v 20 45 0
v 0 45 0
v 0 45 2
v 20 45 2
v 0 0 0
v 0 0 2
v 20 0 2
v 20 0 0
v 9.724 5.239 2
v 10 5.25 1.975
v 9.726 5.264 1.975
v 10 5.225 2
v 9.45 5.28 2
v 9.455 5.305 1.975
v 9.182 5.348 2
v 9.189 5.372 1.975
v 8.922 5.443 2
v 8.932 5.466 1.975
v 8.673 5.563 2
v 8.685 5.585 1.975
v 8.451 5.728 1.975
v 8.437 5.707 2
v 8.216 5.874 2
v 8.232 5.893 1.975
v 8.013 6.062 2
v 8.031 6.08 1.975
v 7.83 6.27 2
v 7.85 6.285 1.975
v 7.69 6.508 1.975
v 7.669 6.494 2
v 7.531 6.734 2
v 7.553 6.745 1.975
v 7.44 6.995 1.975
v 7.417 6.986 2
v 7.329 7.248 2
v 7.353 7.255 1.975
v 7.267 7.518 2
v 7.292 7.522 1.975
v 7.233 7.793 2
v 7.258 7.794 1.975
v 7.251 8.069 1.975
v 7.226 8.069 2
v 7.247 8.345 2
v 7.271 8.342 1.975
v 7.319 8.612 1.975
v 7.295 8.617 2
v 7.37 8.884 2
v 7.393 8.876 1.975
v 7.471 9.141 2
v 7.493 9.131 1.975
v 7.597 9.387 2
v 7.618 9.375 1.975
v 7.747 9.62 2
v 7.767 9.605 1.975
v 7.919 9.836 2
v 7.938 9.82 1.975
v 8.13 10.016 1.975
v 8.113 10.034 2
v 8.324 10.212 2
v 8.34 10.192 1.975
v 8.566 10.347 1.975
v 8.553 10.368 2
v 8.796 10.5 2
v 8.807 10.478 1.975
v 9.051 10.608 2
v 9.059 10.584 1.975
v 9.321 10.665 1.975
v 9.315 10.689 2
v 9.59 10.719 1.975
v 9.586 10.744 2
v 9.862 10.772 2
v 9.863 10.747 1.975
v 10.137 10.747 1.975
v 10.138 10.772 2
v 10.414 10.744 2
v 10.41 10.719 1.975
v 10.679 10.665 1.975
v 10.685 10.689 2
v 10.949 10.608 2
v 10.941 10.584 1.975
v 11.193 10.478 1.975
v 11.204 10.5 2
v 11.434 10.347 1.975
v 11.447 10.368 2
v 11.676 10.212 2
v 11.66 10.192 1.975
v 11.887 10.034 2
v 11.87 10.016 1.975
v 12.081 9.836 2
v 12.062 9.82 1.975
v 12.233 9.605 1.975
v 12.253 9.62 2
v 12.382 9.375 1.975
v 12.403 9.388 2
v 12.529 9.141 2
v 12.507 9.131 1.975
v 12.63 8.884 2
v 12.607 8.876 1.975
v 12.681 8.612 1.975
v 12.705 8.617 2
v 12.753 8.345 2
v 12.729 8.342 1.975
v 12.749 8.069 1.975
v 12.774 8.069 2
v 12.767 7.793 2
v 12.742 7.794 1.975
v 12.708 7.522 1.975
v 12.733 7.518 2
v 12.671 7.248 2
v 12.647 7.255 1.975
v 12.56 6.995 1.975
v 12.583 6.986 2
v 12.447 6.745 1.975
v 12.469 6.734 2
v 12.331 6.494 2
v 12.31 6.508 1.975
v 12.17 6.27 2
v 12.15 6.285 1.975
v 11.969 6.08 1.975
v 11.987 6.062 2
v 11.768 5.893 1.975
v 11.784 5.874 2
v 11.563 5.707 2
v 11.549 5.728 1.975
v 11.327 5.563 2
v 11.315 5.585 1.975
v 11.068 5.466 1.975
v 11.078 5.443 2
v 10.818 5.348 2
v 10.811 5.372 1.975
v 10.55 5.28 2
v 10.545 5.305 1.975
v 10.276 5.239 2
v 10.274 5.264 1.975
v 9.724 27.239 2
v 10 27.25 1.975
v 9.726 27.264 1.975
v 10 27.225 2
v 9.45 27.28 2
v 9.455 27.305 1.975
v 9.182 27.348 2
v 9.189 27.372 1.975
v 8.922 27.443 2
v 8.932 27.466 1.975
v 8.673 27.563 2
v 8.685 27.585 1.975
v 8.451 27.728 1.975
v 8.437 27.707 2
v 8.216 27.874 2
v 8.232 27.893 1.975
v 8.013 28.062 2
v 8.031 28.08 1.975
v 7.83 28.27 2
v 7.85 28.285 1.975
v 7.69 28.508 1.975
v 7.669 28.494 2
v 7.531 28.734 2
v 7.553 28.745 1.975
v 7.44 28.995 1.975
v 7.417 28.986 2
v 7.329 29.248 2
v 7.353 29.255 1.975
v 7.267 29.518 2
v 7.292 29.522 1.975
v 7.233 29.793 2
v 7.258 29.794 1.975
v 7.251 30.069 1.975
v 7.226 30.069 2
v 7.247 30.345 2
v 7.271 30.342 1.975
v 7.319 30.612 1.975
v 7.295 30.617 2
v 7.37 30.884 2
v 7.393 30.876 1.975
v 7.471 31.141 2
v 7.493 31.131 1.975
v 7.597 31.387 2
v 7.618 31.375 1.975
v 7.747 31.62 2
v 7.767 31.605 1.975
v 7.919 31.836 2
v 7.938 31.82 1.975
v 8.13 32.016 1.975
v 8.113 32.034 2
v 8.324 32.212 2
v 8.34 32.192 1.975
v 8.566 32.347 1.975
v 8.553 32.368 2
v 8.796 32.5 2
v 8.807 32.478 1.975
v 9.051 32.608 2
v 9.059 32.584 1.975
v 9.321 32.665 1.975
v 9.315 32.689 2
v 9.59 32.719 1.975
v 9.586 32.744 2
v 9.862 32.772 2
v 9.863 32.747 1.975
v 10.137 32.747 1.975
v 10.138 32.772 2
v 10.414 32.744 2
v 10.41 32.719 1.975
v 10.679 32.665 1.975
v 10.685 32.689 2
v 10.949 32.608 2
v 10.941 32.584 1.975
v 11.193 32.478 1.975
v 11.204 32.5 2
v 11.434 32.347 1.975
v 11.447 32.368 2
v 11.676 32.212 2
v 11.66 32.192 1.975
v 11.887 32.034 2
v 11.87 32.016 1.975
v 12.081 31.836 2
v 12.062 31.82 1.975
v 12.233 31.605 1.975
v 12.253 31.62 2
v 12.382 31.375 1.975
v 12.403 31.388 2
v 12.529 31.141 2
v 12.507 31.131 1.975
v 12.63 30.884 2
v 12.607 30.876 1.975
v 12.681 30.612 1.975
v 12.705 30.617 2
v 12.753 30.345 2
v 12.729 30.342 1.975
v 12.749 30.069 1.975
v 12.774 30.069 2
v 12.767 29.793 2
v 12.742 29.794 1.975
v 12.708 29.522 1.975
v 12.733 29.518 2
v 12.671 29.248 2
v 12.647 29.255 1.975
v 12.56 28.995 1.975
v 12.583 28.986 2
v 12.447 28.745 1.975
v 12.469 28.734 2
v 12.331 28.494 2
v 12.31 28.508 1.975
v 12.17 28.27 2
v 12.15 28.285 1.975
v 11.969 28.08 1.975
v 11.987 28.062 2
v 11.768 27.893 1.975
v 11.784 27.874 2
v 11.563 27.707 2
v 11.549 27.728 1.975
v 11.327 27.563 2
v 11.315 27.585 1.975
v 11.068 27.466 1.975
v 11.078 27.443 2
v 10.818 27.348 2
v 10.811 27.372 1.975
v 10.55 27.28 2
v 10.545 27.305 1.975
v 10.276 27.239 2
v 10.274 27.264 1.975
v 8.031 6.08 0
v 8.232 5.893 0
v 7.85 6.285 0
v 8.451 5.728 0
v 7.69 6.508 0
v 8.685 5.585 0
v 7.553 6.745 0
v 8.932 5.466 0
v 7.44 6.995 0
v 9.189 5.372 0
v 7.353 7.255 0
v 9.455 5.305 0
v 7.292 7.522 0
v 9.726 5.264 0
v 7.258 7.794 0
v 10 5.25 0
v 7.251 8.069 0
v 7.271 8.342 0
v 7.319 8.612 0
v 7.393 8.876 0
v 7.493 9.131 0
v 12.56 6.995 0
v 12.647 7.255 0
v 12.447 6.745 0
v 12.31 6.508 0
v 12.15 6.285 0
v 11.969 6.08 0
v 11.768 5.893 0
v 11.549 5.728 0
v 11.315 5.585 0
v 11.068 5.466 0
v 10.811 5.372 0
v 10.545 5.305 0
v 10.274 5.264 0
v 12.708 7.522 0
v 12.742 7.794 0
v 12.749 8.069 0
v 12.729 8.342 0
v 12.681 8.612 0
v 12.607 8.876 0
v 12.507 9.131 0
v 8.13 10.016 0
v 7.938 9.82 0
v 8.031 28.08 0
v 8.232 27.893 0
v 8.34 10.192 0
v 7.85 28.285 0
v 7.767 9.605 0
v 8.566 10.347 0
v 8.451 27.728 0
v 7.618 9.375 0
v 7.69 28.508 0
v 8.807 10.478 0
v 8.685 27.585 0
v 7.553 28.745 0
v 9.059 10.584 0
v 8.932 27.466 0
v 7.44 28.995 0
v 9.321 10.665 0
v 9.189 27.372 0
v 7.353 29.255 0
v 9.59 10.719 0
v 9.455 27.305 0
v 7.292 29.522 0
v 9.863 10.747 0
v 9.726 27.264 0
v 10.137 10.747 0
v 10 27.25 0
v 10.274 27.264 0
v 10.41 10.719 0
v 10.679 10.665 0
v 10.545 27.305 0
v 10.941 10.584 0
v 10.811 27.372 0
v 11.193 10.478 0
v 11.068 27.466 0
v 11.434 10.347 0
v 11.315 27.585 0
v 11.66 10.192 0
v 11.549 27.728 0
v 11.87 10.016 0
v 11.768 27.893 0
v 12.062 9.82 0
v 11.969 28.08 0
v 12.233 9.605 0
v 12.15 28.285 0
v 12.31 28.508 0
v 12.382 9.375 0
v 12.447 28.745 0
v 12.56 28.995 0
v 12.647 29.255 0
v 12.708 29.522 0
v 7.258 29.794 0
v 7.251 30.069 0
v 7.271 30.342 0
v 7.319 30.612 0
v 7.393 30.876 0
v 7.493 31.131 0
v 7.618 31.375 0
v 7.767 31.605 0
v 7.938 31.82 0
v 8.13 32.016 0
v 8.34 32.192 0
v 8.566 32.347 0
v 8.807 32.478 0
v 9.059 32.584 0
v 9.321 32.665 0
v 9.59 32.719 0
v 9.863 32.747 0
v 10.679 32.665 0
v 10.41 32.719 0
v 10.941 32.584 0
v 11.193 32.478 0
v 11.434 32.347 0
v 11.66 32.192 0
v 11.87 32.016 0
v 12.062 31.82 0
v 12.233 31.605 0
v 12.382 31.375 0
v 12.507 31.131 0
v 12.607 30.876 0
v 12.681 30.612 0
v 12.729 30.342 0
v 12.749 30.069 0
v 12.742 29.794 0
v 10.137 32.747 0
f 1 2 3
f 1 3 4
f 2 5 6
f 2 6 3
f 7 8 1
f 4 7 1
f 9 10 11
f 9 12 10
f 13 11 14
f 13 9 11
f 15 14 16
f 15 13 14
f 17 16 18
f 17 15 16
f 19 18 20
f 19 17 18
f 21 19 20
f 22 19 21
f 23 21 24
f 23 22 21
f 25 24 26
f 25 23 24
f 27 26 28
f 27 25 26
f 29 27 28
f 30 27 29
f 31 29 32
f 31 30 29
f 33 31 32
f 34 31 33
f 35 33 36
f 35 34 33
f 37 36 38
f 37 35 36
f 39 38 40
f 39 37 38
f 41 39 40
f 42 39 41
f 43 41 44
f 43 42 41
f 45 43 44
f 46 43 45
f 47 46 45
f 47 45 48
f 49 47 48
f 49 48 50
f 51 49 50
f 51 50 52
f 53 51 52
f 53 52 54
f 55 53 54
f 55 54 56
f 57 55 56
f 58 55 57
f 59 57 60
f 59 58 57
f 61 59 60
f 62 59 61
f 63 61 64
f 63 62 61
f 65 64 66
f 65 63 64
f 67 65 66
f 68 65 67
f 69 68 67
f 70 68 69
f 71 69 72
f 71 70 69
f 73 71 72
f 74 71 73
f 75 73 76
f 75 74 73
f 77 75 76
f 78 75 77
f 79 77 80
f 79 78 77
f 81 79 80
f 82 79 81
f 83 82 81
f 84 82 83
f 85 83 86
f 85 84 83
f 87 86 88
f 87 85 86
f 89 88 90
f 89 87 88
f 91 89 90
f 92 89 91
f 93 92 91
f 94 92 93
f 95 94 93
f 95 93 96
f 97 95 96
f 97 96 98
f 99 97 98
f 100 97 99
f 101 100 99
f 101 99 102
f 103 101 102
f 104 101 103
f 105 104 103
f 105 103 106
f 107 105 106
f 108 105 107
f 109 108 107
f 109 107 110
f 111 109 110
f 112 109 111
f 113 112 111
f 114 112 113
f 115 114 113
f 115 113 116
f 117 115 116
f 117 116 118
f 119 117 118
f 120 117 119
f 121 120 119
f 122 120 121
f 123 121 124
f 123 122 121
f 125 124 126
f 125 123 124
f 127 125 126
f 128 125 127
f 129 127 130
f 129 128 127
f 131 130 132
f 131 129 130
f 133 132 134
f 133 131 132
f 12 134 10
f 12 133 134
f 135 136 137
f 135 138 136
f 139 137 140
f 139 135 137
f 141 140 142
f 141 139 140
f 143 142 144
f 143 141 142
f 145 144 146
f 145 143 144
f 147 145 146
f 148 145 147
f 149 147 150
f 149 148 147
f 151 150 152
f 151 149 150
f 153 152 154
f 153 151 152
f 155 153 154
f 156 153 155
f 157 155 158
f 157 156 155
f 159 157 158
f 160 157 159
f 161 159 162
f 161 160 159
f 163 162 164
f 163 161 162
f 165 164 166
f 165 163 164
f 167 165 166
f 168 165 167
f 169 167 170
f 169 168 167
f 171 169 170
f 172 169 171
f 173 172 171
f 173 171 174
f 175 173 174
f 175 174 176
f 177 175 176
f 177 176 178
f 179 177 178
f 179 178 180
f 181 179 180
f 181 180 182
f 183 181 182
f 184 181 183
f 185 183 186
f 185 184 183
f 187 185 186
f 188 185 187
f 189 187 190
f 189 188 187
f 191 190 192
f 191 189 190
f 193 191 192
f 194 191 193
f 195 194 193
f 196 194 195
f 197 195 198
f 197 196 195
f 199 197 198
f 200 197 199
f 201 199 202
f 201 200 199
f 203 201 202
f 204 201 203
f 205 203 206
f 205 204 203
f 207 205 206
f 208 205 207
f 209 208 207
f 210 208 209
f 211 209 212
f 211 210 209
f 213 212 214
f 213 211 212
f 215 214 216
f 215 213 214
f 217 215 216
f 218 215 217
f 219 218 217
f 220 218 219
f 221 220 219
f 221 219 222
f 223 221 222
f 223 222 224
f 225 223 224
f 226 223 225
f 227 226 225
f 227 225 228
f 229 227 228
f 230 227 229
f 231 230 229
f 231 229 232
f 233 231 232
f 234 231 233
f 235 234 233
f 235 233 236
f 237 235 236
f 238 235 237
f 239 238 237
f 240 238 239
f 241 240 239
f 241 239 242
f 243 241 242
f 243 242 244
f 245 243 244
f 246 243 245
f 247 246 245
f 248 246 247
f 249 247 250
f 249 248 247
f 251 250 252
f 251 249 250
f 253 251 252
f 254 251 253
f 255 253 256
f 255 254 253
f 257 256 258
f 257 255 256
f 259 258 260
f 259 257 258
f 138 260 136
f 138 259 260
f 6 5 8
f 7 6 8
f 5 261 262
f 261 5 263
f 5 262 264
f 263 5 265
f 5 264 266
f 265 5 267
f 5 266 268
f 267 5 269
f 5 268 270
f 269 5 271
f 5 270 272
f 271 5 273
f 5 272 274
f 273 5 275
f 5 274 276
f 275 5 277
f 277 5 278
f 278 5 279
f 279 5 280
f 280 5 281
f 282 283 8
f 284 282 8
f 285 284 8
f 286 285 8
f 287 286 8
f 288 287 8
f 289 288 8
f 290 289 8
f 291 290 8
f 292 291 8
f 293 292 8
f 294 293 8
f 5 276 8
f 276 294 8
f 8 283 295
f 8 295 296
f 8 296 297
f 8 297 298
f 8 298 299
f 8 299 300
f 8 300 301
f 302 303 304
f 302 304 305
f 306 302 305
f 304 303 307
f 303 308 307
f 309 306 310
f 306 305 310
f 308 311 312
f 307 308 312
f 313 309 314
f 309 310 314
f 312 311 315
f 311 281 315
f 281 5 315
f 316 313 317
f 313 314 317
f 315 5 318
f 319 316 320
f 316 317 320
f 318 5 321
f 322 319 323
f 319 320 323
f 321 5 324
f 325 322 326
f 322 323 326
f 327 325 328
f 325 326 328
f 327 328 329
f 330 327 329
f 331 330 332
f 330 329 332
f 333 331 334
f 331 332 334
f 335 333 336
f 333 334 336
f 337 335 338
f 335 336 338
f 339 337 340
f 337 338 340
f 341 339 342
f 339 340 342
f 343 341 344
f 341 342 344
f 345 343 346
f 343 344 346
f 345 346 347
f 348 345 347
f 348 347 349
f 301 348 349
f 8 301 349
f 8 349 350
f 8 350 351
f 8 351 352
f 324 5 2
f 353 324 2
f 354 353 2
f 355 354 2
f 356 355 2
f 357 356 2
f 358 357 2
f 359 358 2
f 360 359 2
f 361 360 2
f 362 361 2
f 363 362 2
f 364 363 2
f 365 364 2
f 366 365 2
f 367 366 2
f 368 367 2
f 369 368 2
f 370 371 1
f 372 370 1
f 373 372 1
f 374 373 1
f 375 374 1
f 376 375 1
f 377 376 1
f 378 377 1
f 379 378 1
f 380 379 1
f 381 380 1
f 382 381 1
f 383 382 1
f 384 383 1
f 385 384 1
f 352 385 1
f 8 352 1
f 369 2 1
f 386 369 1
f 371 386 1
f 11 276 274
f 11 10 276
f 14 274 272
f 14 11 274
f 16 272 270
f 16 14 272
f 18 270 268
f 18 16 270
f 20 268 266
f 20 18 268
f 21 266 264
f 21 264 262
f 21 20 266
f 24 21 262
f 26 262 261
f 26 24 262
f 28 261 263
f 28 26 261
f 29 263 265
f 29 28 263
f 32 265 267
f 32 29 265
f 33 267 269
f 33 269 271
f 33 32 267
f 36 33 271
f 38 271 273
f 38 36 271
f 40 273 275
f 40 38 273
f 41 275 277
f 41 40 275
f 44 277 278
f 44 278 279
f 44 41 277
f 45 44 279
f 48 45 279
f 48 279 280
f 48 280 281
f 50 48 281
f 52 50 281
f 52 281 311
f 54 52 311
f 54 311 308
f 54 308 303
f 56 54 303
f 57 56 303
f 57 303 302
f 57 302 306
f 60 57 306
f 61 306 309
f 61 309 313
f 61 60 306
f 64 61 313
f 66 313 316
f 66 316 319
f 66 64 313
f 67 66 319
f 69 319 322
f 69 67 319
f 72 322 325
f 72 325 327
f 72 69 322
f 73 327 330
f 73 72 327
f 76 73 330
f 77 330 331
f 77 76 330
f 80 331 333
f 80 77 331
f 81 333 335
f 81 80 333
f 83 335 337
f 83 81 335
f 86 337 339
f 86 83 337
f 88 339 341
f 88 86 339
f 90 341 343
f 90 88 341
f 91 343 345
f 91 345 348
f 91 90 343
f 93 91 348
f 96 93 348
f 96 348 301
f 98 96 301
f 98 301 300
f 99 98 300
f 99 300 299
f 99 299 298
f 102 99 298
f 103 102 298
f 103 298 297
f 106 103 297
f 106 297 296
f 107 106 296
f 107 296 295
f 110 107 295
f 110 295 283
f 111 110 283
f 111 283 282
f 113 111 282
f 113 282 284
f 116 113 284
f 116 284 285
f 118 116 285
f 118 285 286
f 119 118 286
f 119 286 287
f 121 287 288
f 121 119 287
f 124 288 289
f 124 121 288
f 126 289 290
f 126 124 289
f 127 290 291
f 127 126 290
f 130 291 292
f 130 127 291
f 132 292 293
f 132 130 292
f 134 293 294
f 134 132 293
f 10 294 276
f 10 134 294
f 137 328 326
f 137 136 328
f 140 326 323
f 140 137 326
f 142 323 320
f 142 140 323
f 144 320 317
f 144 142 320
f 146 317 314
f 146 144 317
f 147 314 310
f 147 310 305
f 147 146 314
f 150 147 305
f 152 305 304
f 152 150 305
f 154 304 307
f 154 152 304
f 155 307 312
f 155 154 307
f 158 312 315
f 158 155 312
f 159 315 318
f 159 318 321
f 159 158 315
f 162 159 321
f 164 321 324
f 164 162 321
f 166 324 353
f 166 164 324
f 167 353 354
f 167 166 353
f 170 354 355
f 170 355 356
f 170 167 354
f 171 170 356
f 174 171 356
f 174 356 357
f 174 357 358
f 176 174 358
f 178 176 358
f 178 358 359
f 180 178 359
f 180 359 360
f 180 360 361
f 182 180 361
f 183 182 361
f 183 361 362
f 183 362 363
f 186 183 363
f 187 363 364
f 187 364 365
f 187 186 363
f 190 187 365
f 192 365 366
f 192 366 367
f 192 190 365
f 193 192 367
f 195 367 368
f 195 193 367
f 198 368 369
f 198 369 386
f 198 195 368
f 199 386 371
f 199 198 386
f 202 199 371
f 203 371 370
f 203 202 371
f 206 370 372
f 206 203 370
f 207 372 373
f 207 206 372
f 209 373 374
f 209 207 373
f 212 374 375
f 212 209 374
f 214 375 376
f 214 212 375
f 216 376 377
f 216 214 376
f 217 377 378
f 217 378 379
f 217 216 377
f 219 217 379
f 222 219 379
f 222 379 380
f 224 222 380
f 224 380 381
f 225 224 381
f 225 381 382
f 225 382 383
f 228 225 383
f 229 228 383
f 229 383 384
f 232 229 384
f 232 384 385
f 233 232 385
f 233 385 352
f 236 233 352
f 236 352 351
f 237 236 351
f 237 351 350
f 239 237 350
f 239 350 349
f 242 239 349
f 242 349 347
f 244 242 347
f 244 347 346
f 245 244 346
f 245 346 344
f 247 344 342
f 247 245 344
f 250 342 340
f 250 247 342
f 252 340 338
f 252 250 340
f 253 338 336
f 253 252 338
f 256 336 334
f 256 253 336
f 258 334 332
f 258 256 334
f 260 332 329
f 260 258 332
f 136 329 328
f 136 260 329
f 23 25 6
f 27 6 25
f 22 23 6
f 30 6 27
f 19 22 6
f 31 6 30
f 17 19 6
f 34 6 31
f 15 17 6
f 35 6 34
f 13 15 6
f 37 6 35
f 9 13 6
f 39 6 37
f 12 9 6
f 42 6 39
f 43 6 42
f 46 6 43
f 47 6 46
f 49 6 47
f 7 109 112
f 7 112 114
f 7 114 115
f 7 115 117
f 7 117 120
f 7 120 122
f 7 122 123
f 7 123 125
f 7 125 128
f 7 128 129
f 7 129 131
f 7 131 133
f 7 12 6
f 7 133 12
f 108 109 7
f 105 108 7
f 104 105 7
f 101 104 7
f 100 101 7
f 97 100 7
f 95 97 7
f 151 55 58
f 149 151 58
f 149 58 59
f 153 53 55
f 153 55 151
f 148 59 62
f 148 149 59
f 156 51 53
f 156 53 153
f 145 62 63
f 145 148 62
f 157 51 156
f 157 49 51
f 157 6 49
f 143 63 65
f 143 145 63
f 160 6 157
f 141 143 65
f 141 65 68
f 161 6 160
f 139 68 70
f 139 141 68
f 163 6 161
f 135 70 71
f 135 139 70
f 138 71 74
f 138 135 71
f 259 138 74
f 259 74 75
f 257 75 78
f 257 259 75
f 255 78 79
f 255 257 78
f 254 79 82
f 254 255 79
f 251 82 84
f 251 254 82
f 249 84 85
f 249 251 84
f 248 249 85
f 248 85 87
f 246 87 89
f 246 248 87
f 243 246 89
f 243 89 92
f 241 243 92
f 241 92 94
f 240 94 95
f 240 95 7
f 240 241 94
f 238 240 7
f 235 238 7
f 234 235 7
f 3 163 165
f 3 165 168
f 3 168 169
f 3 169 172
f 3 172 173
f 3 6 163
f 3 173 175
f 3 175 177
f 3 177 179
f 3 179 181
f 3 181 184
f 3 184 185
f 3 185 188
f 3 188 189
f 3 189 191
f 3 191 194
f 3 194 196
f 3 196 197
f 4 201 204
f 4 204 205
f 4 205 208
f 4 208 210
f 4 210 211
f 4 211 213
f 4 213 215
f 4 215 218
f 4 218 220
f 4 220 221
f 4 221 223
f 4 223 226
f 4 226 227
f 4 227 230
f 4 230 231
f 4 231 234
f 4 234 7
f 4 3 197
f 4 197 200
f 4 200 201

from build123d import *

# Parameters (mm, degrees)
SKETCH1_W                     = 20
SKETCH1_H                     = 45
BOSS_EXTRUDE1_DEPTH           = 2
M5_CLEARANCE_HOLE1_AT_2_COUNT = 2
M5_CLEARANCE_HOLE1_AT_2_PITCH = 22


with BuildPart() as part:
    # Sketch1 → Boss-Extrude1 (new body)
    with BuildSketch(Plane.XY):
        with Locations((10, 22.5)):
            Rectangle(SKETCH1_W, SKETCH1_H)
    extrude(amount=BOSS_EXTRUDE1_DEPTH)

    # Sketch3 → M5 Clearance Hole1 (revolve, cut)
    with BuildSketch(Plane(origin=(10, 30, 2), x_dir=(0, -1, 0), z_dir=(1, 0, 0))):
        Polygon((0, 0), (0, 2), (2.75, 2), (2.75, 0.025), (2.775, 0), align=None)
    m5_clearance_hole1 = revolve(axis=Axis((10, 30, 8.35), (0, 0, -1)), mode=Mode.SUBTRACT)

    # M5 Clearance Hole1 at 2: M5 Clearance Hole1 ×2
    with Locations(*[(0, -i * M5_CLEARANCE_HOLE1_AT_2_PITCH, 0) for i in range(1, M5_CLEARANCE_HOLE1_AT_2_COUNT)]):
        add(m5_clearance_hole1, mode=Mode.SUBTRACT)


solid = part.part
